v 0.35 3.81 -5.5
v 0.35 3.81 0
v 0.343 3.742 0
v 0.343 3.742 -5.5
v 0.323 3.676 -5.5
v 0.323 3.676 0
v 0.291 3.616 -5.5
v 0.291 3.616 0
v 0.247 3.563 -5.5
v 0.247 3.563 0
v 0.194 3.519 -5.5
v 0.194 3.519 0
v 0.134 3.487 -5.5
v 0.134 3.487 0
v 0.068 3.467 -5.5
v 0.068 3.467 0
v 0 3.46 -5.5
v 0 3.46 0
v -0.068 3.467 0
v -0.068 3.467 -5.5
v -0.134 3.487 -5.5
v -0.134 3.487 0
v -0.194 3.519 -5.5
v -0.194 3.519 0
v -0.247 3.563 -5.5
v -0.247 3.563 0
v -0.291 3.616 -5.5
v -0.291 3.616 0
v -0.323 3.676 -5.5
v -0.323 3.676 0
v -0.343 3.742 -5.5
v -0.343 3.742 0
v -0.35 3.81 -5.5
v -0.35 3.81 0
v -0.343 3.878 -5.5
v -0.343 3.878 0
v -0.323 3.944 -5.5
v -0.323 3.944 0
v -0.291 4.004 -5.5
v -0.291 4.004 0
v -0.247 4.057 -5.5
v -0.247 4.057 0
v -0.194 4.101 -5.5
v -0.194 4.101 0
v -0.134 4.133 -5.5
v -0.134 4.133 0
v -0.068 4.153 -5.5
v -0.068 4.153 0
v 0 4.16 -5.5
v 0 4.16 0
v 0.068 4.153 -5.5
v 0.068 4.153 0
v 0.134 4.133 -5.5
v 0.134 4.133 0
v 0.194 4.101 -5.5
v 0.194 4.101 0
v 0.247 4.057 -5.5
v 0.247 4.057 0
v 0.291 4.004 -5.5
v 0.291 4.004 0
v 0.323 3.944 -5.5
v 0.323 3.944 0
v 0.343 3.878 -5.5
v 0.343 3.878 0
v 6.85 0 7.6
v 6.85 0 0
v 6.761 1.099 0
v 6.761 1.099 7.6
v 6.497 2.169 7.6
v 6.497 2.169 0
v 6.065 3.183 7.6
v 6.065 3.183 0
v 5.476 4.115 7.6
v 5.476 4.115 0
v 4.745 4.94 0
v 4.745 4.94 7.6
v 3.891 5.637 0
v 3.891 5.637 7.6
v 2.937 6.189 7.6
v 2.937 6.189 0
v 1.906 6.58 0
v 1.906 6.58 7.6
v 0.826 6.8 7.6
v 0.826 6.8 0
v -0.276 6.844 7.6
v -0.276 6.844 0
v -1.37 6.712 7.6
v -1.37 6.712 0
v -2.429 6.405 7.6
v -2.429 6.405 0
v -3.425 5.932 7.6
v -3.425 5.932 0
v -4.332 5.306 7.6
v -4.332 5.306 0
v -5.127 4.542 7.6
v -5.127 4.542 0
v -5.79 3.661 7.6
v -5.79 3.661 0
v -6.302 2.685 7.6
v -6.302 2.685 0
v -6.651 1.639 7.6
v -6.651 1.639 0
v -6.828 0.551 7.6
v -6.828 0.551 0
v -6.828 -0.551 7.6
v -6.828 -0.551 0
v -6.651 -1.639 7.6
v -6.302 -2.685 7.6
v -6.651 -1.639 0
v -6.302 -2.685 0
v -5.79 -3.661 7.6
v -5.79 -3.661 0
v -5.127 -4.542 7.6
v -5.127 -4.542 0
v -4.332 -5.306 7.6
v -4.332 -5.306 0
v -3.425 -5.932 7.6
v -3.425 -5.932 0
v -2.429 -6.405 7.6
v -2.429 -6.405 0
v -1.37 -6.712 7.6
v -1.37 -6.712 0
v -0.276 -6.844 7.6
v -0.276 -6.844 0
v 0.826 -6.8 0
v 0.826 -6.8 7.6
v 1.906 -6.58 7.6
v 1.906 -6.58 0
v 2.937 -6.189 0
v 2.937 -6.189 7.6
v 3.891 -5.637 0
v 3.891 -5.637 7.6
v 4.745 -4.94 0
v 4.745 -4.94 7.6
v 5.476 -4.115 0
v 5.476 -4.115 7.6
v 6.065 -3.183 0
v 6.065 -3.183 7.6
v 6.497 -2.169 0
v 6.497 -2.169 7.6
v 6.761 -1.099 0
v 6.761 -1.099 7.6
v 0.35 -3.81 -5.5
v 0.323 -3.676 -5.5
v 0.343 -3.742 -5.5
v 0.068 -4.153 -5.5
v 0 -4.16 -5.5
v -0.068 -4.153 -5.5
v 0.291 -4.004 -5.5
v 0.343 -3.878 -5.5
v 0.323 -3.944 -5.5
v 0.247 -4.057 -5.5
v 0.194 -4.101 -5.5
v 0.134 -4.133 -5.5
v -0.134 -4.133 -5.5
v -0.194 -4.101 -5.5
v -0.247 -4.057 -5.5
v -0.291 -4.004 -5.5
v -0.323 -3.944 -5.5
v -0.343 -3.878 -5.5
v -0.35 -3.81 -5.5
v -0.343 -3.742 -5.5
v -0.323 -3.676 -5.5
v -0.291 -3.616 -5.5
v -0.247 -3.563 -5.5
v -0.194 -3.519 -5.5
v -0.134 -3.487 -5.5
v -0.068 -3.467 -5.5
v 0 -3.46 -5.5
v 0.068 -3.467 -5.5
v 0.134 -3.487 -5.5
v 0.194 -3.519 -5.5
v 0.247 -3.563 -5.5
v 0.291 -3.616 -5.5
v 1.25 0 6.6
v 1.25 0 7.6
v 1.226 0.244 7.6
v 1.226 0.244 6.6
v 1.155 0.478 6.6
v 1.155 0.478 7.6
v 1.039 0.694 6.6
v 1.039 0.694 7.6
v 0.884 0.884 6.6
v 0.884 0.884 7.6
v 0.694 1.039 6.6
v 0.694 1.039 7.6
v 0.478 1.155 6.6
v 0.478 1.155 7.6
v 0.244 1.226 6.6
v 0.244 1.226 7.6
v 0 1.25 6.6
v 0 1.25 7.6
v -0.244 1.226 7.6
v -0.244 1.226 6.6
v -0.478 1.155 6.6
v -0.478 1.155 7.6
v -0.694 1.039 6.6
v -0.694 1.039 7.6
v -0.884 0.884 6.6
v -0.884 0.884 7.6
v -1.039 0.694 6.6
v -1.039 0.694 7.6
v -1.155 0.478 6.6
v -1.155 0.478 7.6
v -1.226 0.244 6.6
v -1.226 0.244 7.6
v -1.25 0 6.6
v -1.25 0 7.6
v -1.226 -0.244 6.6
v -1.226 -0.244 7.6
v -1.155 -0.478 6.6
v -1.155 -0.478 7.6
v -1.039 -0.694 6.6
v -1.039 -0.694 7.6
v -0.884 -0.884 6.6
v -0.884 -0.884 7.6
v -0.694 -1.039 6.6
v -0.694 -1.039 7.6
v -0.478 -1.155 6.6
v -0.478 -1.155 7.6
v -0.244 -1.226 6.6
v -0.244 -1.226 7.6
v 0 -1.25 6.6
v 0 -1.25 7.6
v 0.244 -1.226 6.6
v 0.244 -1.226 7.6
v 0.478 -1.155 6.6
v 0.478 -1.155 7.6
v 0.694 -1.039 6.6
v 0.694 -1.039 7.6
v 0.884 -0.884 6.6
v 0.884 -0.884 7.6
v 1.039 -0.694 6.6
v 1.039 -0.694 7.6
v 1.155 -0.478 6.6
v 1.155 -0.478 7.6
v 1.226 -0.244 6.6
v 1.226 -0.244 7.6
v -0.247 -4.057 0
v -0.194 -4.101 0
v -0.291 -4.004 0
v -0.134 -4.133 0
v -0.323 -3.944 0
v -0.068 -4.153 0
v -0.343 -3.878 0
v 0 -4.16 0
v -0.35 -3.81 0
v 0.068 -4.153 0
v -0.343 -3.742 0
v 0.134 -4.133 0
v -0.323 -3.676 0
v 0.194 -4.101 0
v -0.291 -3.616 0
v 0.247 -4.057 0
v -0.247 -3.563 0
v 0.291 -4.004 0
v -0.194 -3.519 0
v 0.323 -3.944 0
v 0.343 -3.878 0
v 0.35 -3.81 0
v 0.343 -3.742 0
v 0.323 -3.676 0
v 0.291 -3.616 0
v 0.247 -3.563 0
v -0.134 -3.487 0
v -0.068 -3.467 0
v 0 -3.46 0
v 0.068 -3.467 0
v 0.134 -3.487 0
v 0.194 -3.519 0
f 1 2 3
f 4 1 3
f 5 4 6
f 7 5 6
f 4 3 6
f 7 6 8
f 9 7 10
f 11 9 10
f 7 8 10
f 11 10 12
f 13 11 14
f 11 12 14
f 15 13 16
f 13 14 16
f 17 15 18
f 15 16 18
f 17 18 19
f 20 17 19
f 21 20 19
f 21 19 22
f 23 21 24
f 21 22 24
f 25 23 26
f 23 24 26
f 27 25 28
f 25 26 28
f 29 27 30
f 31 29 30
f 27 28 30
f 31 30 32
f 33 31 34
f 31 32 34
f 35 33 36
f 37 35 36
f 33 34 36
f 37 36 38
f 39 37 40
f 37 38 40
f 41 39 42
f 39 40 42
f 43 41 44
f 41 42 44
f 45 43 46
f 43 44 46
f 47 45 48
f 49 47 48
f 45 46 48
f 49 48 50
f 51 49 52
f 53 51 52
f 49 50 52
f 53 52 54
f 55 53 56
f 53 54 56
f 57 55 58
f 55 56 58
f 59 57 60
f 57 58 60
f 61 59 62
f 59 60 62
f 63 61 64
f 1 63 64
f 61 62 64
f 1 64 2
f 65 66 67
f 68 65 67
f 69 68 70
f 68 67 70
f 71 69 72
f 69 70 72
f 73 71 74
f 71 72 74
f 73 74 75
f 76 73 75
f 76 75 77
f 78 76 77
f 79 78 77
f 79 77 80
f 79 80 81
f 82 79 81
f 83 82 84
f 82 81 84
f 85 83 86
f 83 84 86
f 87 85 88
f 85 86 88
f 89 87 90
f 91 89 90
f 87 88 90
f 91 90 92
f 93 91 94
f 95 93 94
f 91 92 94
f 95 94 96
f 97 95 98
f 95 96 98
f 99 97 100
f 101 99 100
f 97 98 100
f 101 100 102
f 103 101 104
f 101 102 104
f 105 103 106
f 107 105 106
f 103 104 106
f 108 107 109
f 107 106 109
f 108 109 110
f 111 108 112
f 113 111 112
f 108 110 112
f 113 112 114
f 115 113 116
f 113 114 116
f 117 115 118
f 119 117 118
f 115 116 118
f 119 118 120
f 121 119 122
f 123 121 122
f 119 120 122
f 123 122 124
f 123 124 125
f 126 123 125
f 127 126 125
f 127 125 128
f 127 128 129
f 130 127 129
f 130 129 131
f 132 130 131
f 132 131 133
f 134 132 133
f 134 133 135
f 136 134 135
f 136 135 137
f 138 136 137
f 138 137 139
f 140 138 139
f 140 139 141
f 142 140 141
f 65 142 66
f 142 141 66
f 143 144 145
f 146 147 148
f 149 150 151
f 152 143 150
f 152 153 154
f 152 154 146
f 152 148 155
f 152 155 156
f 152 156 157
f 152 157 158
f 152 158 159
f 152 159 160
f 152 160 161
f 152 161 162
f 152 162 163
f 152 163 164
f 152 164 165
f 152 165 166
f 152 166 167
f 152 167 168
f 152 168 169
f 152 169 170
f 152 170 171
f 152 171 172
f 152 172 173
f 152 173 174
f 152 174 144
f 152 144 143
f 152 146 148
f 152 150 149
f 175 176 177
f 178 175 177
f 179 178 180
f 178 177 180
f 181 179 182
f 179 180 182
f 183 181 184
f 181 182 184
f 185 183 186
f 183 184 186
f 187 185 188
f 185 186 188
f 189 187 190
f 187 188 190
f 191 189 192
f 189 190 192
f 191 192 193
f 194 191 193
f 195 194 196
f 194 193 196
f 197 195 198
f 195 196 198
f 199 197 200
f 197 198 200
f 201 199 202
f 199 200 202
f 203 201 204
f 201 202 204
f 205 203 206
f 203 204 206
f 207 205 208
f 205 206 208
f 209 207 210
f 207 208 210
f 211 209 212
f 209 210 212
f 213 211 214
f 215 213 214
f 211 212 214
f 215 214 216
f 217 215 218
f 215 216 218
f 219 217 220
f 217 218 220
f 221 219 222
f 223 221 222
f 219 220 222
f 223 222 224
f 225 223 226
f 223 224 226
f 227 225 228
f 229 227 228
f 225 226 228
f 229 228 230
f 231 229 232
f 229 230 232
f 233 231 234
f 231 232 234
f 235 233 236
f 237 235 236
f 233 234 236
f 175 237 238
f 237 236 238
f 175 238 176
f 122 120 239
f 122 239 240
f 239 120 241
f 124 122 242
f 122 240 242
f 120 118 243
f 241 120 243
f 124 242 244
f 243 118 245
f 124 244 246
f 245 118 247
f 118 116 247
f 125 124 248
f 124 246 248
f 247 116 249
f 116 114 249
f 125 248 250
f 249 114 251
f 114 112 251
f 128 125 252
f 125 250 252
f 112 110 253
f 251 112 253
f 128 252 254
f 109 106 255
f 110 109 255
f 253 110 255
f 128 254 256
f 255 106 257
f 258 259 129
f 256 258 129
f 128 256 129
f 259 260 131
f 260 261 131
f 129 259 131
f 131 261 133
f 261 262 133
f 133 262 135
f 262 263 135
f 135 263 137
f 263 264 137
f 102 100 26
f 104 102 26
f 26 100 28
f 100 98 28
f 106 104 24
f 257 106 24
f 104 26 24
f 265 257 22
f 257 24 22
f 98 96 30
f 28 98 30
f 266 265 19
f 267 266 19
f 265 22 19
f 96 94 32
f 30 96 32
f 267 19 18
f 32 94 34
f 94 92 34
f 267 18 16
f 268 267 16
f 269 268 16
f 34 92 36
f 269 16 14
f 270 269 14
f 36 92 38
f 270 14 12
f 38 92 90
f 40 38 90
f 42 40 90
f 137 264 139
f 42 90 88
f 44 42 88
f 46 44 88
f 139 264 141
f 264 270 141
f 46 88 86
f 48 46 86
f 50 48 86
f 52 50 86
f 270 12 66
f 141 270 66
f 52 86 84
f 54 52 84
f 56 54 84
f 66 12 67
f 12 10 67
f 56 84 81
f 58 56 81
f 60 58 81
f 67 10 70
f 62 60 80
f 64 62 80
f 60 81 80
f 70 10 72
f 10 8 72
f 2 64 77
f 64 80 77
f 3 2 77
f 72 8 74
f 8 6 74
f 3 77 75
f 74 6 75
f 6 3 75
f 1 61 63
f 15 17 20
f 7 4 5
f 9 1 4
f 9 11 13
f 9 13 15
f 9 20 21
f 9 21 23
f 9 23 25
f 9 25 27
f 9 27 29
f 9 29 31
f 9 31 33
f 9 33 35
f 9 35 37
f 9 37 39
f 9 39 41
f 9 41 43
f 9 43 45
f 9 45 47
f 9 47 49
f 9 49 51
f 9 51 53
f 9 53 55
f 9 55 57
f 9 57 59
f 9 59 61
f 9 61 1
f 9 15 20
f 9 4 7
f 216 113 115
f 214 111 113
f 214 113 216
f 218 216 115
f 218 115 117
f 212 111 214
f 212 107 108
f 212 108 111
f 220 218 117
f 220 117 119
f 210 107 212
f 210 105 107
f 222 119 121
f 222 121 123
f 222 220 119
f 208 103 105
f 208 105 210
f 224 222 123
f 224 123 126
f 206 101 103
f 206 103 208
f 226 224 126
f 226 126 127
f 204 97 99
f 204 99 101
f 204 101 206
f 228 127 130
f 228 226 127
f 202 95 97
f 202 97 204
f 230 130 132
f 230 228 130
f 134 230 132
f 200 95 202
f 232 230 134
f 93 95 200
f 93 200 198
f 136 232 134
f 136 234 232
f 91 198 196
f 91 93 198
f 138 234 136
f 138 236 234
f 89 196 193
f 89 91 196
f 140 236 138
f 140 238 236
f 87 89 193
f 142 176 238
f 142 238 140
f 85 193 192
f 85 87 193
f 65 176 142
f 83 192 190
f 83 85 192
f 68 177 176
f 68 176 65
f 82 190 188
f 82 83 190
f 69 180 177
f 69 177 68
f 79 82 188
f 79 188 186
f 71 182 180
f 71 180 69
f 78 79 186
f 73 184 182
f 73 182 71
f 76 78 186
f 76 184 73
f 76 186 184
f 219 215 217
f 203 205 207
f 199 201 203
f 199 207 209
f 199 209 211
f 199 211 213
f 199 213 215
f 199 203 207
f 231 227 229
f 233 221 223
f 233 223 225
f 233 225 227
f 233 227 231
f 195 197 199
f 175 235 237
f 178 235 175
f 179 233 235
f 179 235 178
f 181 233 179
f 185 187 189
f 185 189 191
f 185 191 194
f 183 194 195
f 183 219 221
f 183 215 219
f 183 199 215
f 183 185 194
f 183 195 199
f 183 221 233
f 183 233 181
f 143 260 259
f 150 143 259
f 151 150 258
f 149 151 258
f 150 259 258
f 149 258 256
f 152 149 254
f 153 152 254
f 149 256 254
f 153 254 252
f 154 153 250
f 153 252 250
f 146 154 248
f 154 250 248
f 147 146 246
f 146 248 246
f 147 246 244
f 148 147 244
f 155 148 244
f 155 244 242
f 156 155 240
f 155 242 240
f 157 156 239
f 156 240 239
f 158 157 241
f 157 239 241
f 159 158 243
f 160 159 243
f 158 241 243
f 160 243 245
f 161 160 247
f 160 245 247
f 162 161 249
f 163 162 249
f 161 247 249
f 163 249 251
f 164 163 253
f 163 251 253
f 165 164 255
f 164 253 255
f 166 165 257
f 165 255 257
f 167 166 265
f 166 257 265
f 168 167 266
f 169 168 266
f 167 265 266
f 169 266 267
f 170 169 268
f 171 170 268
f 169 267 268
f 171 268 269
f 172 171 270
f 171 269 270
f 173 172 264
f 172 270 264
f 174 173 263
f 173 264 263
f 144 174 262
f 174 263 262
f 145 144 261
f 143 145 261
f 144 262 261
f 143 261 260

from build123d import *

# Parameters (mm, degrees)
F0_R     = 6.85
F1_DEPTH = 7.6
F2_R     = 1.25
F3_DEPTH = 1
F4_R     = 0.35
F5_DEPTH = 5.5


with BuildPart() as f1:
    # F0 (on Top) → F1 (new body)
    with BuildSketch(Plane.XY):
        Circle(F0_R)
    extrude(amount=F1_DEPTH)

    # F2 (on face) → F3 (cut)
    with BuildSketch(Plane.XY.offset(7.6)):
        Circle(F2_R)
    extrude(amount=-F3_DEPTH, mode=Mode.SUBTRACT)

    # F4 (on face) → F5 (join)
    with BuildSketch(Plane(origin=(0, 0, 0), x_dir=(1, 0, 0), z_dir=(0, 0, -1))):
        with Locations((0, 3.81)):
            Circle(F4_R)
        with Locations((0, -3.81)):
            Circle(F4_R)
    extrude(amount=F5_DEPTH)


solid = f1.part
